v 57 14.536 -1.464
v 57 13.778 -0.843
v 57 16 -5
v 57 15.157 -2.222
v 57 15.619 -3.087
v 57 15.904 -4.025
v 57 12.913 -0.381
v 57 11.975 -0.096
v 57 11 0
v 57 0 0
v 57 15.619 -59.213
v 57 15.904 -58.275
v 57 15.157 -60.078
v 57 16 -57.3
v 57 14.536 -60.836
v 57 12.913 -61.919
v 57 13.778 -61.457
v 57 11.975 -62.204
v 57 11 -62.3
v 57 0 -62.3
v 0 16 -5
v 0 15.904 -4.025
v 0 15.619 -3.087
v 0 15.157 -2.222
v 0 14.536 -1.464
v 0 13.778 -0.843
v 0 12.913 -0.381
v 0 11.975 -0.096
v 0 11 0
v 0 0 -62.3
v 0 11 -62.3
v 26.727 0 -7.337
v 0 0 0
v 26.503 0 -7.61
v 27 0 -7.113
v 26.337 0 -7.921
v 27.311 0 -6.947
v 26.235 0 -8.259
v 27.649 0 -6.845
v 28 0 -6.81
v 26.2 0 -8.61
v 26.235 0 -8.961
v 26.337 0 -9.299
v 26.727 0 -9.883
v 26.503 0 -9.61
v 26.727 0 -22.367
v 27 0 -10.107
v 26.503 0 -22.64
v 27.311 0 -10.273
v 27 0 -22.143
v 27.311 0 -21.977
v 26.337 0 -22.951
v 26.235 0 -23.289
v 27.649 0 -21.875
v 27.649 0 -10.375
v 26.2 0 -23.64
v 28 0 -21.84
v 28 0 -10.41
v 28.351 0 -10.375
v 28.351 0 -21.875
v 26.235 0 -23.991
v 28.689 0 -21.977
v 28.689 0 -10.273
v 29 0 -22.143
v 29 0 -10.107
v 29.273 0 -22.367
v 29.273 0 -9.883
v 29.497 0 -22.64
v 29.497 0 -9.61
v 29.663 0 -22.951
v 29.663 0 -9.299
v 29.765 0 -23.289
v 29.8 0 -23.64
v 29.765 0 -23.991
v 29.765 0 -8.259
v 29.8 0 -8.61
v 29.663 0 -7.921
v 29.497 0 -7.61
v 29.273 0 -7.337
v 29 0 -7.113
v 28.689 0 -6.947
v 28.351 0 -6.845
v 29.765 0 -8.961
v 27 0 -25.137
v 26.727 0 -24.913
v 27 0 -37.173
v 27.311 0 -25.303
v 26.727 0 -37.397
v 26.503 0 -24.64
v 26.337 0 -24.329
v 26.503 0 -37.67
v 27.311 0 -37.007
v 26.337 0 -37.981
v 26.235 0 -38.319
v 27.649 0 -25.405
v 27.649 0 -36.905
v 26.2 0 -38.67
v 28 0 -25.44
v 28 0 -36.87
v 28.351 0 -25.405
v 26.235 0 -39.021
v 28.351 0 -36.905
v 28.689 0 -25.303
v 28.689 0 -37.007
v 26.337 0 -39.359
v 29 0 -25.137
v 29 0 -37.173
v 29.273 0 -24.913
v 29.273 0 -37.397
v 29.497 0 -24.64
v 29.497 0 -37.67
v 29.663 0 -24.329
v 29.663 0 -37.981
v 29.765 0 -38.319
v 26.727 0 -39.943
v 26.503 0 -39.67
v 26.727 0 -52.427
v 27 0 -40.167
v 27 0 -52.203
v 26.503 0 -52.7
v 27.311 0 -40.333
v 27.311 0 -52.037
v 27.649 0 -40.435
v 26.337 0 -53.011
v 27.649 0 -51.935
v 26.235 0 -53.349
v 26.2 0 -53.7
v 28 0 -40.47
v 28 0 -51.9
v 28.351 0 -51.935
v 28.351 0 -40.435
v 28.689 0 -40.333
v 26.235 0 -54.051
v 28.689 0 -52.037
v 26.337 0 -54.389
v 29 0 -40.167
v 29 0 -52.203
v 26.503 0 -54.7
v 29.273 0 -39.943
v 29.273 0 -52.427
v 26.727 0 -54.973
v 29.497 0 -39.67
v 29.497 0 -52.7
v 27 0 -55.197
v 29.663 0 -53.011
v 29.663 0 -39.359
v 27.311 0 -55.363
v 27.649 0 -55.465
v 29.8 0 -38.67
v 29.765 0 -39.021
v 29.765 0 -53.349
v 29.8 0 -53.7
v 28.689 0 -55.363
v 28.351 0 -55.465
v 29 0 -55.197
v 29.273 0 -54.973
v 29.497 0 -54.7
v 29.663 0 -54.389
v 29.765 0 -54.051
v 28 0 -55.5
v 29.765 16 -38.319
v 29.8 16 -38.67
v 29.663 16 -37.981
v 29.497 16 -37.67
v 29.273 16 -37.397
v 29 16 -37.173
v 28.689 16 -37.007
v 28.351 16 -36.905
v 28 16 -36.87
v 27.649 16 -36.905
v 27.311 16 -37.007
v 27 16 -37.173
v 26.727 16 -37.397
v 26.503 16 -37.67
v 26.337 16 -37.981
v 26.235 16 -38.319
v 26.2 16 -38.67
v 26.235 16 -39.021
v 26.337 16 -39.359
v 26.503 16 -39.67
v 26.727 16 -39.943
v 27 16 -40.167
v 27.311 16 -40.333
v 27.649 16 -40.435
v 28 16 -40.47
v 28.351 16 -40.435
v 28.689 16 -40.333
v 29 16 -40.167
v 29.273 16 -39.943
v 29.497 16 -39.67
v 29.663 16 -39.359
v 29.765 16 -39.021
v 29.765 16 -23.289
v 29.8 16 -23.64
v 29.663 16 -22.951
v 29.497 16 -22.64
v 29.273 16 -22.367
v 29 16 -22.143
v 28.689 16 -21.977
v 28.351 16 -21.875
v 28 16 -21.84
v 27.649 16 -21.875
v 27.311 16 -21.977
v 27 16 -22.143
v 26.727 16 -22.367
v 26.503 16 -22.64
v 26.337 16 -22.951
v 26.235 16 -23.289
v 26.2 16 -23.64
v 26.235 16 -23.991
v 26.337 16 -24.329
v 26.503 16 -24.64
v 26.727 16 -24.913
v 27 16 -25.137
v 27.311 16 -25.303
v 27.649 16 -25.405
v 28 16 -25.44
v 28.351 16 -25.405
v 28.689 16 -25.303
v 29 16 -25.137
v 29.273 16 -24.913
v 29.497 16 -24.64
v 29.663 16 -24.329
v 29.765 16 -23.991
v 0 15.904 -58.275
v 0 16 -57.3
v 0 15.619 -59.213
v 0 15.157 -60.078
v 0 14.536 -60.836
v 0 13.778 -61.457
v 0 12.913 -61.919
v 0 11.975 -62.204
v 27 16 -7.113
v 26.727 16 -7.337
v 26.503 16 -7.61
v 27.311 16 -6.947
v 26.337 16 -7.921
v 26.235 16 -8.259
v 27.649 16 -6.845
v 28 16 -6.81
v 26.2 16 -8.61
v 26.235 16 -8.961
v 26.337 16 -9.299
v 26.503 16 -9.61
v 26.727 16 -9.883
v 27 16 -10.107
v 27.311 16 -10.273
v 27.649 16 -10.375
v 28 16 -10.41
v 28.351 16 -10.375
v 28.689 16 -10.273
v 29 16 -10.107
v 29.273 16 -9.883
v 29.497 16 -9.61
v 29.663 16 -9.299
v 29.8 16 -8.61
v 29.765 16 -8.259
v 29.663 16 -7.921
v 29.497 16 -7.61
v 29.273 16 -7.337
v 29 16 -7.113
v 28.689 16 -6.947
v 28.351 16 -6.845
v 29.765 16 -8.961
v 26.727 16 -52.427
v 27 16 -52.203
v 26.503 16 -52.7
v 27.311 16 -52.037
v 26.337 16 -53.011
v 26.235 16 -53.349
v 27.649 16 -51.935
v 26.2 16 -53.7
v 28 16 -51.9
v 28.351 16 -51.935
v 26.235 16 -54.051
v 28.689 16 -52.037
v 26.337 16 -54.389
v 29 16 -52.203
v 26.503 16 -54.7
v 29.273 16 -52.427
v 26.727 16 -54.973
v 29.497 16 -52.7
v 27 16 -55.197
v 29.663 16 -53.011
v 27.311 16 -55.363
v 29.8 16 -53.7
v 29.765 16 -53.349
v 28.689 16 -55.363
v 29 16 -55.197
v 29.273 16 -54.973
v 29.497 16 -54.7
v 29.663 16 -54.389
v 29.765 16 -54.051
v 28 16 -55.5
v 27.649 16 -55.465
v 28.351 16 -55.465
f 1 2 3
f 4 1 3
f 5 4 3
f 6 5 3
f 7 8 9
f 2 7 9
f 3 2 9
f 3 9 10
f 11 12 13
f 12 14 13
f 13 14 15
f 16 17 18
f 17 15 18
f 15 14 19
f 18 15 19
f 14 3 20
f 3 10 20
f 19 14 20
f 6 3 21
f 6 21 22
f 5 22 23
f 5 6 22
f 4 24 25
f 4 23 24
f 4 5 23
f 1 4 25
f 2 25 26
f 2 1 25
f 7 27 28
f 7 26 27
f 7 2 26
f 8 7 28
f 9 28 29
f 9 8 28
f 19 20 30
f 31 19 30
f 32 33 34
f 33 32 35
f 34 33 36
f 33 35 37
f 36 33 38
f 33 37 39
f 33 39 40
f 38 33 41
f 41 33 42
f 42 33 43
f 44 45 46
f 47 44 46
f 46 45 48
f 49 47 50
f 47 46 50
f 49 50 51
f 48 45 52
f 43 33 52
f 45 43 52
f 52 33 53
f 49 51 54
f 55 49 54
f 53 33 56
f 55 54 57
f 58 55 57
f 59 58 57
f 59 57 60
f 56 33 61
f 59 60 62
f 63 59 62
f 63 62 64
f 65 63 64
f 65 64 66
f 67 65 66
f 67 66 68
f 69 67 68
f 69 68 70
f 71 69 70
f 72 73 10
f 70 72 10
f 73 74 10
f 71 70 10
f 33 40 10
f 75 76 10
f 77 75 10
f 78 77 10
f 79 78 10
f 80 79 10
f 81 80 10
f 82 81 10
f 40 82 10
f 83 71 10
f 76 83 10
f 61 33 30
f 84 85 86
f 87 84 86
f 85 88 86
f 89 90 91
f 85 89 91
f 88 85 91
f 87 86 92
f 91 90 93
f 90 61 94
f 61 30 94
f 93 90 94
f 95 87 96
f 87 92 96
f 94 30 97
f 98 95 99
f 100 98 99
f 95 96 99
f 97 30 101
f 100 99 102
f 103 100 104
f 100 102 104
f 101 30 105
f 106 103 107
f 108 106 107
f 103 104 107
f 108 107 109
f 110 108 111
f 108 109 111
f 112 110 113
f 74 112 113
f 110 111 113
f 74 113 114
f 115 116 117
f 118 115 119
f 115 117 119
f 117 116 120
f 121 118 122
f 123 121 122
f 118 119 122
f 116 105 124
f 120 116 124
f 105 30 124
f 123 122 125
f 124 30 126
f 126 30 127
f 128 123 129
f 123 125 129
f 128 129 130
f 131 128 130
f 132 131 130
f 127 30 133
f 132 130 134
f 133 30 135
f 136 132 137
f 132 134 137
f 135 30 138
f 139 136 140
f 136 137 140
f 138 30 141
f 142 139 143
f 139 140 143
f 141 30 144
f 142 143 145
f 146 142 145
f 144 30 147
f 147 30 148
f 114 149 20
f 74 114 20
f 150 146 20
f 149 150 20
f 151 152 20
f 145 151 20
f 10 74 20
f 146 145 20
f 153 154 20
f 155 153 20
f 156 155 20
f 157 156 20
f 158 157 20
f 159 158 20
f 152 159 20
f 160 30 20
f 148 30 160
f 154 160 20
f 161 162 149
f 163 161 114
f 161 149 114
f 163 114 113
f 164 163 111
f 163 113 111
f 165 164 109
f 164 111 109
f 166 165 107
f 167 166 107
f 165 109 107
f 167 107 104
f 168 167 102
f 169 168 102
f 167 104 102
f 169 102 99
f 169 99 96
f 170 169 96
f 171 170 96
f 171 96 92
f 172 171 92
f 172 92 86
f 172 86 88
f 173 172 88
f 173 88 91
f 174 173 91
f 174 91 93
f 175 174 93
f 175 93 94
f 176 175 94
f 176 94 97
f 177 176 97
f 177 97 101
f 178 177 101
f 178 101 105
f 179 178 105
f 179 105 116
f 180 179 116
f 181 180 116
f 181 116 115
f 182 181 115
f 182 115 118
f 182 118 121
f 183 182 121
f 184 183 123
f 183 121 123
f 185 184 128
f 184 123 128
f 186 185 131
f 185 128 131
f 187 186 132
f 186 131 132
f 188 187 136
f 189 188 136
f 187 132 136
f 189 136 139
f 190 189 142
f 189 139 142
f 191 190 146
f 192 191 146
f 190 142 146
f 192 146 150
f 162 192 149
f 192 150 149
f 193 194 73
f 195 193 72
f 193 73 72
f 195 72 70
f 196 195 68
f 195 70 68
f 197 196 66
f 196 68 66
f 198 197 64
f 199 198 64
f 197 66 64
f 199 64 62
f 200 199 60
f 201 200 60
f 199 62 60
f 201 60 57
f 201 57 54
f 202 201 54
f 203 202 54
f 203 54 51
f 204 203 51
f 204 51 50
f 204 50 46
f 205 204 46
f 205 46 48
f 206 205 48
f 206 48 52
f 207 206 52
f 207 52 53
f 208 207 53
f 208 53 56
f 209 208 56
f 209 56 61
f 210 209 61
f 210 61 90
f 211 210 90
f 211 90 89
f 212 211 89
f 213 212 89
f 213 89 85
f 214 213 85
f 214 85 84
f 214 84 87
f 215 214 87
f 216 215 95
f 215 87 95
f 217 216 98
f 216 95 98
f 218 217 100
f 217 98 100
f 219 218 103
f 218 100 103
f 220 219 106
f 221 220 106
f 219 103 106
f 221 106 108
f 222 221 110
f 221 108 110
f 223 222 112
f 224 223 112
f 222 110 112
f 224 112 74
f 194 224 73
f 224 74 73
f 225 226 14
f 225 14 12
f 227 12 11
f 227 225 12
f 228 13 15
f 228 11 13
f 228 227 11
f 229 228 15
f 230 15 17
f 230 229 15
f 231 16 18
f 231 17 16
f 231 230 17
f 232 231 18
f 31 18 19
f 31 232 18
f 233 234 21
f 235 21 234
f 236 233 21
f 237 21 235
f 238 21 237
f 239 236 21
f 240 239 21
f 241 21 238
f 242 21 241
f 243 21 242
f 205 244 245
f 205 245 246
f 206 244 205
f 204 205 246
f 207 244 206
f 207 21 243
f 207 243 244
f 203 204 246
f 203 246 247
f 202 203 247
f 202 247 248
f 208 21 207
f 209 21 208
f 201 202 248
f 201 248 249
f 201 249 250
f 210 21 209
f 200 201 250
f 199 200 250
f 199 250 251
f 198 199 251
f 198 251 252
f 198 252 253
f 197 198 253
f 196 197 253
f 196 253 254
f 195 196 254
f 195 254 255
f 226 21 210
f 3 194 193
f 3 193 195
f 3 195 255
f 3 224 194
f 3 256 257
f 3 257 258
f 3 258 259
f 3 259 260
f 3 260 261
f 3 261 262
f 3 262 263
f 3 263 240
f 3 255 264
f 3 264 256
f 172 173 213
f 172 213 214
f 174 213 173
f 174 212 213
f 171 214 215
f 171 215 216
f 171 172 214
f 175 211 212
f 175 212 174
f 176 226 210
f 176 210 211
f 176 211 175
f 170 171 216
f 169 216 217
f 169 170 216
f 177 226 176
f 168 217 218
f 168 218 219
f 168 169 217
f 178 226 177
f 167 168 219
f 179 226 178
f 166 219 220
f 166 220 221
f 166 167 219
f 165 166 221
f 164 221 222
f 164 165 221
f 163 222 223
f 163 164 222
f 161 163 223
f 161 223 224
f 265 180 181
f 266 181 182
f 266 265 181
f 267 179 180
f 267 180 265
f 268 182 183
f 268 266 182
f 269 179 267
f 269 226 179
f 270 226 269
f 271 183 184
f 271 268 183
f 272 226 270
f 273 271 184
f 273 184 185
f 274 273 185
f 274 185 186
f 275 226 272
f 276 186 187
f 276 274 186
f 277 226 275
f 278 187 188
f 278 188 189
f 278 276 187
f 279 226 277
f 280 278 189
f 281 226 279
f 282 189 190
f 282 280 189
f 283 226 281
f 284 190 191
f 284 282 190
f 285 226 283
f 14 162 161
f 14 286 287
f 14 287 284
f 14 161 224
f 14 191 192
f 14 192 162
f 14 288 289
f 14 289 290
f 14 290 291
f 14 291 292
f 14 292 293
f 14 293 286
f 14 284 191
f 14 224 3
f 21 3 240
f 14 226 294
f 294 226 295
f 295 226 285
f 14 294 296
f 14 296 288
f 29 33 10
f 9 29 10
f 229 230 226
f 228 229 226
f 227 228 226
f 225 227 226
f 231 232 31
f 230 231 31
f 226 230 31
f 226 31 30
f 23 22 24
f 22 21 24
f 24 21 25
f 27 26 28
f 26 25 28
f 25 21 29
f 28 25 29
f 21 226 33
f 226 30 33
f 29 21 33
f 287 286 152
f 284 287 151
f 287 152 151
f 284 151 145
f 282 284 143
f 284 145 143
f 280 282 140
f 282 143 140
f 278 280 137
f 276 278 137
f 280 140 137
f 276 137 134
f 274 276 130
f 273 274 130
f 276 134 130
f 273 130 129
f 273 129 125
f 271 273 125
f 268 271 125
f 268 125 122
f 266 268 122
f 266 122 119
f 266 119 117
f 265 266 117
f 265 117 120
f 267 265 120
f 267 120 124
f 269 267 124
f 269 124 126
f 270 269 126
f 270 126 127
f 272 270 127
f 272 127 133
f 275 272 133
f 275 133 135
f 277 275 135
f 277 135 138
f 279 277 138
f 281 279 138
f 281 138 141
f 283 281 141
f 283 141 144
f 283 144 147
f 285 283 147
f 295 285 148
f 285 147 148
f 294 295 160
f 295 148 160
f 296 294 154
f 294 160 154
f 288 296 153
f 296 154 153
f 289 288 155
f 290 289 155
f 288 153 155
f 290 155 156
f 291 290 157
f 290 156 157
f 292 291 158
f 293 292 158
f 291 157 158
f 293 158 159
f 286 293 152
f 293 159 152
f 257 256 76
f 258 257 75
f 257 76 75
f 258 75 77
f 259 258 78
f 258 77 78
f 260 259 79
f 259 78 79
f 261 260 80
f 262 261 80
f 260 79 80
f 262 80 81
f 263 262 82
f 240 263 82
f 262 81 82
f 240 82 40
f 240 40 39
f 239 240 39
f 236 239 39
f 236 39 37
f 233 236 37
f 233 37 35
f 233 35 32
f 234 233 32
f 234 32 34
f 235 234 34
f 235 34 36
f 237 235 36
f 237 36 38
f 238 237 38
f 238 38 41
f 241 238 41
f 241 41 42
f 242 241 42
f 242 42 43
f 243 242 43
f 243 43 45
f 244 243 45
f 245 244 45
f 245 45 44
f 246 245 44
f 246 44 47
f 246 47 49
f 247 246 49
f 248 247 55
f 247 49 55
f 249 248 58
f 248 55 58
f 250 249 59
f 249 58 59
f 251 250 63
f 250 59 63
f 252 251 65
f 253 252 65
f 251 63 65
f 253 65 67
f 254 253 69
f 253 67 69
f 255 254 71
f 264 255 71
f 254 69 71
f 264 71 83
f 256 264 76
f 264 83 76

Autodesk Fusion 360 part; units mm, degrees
sketch "Sketch1" plane through (0, 0, 0) normal (0, 1, 0) x (1, 0, 0)
  line L0 (0, 0) -> (57, 0)
  line L1 (57, 0) -> (57, 62.3)
  line L2 (57, 62.3) -> (0, 62.3)
  line L3 (0, 62.3) -> (0, 0)
  dimension "d1" = 57
  dimension "d2" = 62.3
extrude "Extrude1" add sketch "Sketch1" along normal blind 16
fillet "Fillet1" radius 5 2 edges at (28.5, 16, 0) (28.5, 16, -62.3)
sketch "Sketch2" plane through (0, 16, 0) normal (0, 1, 0) x (-1, 0, 0)
  line L0 (-57, -57.3) -> (0, -57.3)
  line L1 (0, -57.3) -> (0, -5)
  line L2 (0, -5) -> (-57, -5)
  line L3 (-57, -5) -> (-57, -57.3)
  line L4 (-55.4, -6.6) -> (-1.6, -6.6)
  line L5 (-1.6, -6.6) -> (-1.6, -55.7)
  line L6 (-1.6, -55.7) -> (-55.4, -55.7)
  line L7 (-55.4, -55.7) -> (-55.4, -6.6)
  dimension "d7" = 1.6
  dimension "d8" = 1.6
  dimension "d9" = 1.6
  dimension "d10" = 1.6
sketch "Sketch3" plane through (0, 0, 0) normal (0, -1, 0) x (1, 0, 0)
  line L0 (0, 0) -> (0, -62.3)
  line L1 (0, -62.3) -> (57, -62.3)
  line L2 (57, -62.3) -> (57, 0)
  line L3 (57, 0) -> (0, 0)
  circle A0 centre (28, -53.7) radius 1.8
  circle A1 centre (28, -38.67) radius 1.8
  circle A2 centre (28, -23.64) radius 1.8
  circle A3 centre (28, -8.61) radius 1.8
  dimension "d11" = 3.6
  dimension "d12" = 28
  dimension "d13" = 8.6
  dimension "d16" = 0
  dimension "d17" = 15.03
  dimension "d18" = 8.61
extrude "Extrude2" cut sketch "Sketch3" against normal blind 45 contours A0 | A1 | A2 | A3
equation "d9 = d7"
equation "d10 = d9"
equation "d13 = 6.8 mm + ( ( 3.6 / 2 ) * 1 mm )"
equation "d17 = 11.43 mm + 3.6 mm"
